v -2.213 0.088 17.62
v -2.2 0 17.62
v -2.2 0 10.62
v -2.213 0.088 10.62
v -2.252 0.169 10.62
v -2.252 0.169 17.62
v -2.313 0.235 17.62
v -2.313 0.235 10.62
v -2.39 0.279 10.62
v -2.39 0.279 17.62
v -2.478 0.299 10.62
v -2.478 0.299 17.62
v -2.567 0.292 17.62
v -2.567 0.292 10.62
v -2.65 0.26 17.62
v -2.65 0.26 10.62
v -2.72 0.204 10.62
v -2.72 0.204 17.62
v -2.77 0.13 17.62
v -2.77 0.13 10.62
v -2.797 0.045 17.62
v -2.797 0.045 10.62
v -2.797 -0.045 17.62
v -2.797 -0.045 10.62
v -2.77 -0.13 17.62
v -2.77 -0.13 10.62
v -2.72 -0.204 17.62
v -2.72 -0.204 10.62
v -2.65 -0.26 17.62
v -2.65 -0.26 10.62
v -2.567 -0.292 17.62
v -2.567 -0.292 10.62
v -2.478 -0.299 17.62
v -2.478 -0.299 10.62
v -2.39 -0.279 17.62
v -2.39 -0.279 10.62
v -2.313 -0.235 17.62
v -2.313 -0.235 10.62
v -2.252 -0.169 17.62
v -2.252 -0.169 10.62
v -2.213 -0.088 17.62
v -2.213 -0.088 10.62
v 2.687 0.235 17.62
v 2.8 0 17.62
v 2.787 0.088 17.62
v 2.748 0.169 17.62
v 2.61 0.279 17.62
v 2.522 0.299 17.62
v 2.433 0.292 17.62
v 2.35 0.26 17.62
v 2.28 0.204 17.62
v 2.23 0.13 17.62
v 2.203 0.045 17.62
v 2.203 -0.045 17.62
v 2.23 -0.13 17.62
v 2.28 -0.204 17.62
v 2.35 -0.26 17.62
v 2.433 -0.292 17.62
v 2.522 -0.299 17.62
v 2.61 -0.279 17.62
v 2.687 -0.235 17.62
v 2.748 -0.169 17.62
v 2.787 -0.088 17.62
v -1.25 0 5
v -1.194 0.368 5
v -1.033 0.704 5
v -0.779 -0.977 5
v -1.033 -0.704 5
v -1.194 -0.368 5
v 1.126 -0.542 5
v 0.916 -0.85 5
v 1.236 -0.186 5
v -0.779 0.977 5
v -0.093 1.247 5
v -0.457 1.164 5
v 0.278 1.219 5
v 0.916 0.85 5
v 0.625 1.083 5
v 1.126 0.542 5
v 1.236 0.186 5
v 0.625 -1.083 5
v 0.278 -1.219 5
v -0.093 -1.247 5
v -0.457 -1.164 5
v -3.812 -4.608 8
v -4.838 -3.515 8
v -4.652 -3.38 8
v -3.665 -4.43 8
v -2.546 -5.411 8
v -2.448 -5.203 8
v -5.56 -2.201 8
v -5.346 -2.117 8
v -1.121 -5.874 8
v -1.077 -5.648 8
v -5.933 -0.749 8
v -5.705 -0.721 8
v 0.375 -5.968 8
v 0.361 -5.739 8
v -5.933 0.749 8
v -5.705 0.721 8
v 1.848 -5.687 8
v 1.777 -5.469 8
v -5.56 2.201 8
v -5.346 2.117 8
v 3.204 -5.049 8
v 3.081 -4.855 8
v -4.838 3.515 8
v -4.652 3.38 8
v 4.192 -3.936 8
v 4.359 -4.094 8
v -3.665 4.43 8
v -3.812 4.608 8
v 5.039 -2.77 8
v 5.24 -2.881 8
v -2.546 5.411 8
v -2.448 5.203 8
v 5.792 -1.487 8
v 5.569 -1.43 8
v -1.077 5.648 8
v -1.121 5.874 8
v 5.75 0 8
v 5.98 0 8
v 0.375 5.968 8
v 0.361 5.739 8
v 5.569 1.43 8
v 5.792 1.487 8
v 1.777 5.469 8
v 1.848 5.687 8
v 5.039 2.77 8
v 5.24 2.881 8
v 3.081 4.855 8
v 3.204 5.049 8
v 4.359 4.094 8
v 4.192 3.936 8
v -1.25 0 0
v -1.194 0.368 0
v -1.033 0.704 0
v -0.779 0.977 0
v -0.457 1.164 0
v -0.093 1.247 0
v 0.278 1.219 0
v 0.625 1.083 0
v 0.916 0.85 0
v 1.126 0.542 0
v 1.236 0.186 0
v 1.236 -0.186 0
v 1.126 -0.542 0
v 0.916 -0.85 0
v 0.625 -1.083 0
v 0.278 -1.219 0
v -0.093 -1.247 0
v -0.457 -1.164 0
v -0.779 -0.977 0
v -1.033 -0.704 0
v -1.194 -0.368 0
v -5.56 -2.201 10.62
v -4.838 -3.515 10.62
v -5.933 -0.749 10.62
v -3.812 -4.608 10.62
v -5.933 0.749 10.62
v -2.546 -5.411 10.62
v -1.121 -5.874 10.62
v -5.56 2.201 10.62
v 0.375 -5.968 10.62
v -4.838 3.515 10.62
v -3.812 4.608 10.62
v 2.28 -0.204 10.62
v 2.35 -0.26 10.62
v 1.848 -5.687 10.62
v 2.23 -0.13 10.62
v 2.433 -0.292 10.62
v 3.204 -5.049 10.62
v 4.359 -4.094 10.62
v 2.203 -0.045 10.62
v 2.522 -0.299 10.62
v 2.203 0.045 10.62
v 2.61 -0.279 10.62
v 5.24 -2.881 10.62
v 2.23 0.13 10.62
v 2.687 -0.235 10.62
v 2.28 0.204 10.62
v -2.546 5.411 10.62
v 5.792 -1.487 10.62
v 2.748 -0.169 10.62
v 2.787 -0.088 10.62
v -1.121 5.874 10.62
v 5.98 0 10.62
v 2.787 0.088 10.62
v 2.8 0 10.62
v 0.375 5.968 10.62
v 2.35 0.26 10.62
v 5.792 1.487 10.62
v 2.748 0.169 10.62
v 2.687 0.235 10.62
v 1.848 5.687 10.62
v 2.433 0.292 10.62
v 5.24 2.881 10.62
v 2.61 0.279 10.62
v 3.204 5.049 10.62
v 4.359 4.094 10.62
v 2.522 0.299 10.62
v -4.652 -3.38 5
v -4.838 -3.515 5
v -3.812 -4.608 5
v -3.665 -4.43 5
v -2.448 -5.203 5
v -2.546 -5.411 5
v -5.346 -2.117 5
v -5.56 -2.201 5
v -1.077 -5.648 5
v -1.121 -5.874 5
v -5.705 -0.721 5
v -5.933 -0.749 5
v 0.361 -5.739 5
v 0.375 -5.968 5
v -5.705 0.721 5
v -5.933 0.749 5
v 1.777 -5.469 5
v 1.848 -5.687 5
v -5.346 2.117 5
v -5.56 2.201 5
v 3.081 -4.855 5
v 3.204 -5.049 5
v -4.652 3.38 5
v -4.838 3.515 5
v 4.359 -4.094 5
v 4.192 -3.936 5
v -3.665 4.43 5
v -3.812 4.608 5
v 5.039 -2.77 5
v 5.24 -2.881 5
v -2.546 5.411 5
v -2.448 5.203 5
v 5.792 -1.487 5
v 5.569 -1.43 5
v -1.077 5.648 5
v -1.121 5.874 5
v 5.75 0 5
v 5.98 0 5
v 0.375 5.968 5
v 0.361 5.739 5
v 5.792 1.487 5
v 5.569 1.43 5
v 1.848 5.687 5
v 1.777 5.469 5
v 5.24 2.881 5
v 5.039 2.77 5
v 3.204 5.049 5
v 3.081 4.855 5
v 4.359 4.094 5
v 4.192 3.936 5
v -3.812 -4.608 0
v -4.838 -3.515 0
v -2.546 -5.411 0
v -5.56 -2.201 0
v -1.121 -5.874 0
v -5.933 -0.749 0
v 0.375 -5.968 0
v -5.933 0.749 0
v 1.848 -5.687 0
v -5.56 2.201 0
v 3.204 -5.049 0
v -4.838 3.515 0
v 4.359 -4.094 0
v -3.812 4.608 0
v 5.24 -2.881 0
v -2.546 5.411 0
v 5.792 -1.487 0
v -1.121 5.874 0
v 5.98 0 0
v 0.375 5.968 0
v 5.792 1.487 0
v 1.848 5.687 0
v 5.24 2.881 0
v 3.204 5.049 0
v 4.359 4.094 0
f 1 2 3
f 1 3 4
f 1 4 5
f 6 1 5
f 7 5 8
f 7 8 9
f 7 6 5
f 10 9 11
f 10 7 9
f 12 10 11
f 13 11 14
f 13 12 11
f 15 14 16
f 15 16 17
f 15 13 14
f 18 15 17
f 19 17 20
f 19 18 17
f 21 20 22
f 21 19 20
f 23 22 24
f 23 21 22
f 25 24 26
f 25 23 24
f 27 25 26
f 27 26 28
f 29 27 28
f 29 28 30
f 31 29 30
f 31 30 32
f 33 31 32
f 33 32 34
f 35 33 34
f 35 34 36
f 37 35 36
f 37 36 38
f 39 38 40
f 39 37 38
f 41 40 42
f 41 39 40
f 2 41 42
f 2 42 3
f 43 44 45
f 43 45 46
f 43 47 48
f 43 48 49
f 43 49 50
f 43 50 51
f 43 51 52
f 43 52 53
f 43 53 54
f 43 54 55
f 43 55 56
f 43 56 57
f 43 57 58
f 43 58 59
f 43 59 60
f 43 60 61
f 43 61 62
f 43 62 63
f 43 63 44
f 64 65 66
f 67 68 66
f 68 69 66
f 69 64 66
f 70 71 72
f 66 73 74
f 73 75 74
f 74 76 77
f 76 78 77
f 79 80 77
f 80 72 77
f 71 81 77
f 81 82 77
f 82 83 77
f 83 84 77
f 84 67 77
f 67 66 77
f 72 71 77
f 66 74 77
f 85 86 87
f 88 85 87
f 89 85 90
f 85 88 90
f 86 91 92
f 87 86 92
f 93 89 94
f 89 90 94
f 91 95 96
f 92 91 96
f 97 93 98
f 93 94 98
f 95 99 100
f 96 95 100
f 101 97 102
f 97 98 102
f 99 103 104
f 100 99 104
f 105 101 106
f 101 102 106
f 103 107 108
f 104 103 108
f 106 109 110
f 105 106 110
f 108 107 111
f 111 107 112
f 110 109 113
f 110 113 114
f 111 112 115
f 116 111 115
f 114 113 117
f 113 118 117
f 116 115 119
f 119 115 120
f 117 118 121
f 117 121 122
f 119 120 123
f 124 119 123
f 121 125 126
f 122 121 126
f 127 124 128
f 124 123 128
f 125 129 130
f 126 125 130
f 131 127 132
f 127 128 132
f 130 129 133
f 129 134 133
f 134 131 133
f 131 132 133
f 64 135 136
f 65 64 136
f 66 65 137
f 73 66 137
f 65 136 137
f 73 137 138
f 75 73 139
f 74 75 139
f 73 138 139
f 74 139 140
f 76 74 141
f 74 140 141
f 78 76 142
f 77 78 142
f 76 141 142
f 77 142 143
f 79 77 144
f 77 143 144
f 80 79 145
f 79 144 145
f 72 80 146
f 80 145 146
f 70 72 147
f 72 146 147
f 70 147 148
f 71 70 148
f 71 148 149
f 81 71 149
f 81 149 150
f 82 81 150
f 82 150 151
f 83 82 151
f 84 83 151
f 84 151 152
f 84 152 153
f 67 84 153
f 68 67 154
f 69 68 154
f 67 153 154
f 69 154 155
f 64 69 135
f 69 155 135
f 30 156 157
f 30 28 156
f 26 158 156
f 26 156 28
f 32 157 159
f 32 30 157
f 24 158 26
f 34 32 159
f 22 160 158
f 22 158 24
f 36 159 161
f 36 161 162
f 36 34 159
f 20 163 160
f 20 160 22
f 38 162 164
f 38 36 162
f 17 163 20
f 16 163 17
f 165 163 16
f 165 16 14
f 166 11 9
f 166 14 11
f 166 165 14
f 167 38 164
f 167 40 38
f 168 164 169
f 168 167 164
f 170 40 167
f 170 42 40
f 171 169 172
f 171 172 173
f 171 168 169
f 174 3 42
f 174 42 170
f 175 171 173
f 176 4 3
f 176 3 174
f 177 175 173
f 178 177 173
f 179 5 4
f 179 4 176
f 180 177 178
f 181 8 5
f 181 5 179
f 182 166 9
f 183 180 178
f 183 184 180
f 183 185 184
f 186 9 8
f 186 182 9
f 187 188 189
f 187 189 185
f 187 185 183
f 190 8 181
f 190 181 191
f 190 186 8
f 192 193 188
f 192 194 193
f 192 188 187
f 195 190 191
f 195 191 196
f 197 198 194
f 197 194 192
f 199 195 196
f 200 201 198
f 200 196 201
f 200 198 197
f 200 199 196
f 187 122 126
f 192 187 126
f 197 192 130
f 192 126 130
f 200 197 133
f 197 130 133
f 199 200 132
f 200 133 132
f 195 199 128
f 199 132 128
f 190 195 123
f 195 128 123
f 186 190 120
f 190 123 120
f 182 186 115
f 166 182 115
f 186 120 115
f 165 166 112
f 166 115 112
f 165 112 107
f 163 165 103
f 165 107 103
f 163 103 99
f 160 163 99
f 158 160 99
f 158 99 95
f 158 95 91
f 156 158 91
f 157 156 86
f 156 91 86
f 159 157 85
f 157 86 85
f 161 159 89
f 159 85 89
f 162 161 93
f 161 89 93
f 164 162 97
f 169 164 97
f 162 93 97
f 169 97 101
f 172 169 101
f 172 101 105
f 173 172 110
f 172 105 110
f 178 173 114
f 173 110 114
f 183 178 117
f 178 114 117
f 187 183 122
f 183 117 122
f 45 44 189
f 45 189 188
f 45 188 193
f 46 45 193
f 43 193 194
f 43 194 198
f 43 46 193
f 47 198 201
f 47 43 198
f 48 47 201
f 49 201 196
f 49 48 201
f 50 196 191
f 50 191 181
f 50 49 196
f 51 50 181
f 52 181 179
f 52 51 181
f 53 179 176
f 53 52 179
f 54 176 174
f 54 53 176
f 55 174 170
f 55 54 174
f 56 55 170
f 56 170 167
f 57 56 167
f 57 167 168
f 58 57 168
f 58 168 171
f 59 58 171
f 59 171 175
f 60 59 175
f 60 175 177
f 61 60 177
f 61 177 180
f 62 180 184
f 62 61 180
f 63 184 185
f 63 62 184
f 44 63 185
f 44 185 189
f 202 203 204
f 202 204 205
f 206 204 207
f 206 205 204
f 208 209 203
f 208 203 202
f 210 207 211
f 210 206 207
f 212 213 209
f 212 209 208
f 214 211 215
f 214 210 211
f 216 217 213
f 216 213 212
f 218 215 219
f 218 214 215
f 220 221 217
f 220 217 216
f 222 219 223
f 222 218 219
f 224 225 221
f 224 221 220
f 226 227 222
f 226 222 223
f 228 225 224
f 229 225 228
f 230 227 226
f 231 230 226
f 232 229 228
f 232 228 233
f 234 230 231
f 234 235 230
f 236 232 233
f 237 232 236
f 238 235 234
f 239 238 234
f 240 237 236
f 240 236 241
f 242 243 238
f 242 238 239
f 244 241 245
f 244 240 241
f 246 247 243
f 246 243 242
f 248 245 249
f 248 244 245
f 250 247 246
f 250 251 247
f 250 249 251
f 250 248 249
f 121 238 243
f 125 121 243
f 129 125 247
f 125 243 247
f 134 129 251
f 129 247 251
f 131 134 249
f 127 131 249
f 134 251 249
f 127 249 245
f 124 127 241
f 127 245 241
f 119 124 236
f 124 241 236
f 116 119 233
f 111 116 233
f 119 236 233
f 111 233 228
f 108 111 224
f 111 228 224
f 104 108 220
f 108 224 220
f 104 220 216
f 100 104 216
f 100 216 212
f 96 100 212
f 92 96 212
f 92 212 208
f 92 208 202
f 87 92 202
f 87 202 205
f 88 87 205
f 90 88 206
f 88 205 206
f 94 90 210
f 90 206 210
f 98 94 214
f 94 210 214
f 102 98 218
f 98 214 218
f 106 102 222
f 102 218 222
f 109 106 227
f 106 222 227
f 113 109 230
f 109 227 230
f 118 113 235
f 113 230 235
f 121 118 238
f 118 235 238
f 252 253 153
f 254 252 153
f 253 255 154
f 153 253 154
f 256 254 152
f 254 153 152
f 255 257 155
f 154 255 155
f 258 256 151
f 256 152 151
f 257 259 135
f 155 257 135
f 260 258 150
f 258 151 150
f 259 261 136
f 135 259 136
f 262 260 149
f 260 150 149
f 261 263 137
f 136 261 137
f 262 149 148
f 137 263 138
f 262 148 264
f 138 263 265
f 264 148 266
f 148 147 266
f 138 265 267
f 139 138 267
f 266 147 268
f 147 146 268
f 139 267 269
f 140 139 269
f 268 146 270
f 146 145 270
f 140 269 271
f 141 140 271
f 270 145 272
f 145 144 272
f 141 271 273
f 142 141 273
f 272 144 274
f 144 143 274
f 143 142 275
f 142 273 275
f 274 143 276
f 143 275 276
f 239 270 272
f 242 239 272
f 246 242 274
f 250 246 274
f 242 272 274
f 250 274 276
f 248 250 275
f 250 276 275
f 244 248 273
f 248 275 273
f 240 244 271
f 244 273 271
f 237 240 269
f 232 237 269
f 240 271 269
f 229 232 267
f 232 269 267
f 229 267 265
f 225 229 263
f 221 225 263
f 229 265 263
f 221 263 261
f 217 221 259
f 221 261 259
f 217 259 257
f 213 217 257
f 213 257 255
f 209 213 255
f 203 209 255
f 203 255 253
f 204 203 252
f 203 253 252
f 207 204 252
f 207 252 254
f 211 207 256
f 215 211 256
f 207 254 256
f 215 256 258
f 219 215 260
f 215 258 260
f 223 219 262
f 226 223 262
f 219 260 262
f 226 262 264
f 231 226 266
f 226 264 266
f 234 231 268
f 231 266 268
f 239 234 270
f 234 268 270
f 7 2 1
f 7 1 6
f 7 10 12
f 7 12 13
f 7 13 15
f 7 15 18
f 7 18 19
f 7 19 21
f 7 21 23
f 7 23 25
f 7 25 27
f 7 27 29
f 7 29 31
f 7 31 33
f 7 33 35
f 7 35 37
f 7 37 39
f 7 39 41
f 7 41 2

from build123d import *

# Parameters (mm, degrees)
SKETCH1_R           = 5.98
BOSS_EXTRUDE1_DEPTH = 5
SKETCH2_R           = 1.25
CUT_EXTRUDE1_DEPTH  = 5
SKETCH3_R           = 5.75
BOSS_EXTRUDE2_DEPTH = 3
SKETCH4_R           = 5.98
BOSS_EXTRUDE3_DEPTH = 2.62
SKETCH5_R           = 0.645
BOSS_EXTRUDE4_DEPTH = 7
SKETCH6_R           = 0.645
SKETCH6_R_2         = 0.3
CUT_EXTRUDE2_DEPTH  = 7


with BuildPart() as part:
    # Sketch1 → Boss-Extrude1 (new body)
    with BuildSketch(Plane.XY):
        Circle(SKETCH1_R)
    extrude(amount=BOSS_EXTRUDE1_DEPTH)

    # Sketch2 → Cut-Extrude1 (cut)
    with BuildSketch(Plane(origin=(0, 0, 0), x_dir=(-1, 0, 0), z_dir=(0, 0, -1))):
        Circle(SKETCH2_R)
    extrude(amount=-CUT_EXTRUDE1_DEPTH, mode=Mode.SUBTRACT)

    # Sketch3 → Boss-Extrude2 (add)
    with BuildSketch(Plane.XY.offset(5)):
        Circle(SKETCH3_R)
    extrude(amount=BOSS_EXTRUDE2_DEPTH)

    # Sketch4 → Boss-Extrude3 (add)
    with BuildSketch(Plane.XY.offset(8)):
        Circle(SKETCH4_R)
    extrude(amount=BOSS_EXTRUDE3_DEPTH)

    # Sketch5 → Boss-Extrude4 (add)
    with BuildSketch(Plane.XY.offset(10.62)):
        with Locations((-2.5, 0)):
            Circle(SKETCH5_R)
        with Locations((2.5, 0)):
            Circle(SKETCH5_R)
    extrude(amount=BOSS_EXTRUDE4_DEPTH)

    # Sketch6 → Cut-Extrude2 (cut)
    with BuildSketch(Plane.XY.offset(17.62)):
        with Locations((-2.5, 0)):
            Circle(SKETCH6_R)
        with Locations((-2.5, 0)):
            Circle(SKETCH6_R_2, mode=Mode.SUBTRACT)
        with Locations((2.5, 0)):
            Circle(SKETCH6_R)
        with Locations((2.5, 0)):
            Circle(SKETCH6_R_2, mode=Mode.SUBTRACT)
    extrude(amount=-CUT_EXTRUDE2_DEPTH, mode=Mode.SUBTRACT)


solid = part.part
